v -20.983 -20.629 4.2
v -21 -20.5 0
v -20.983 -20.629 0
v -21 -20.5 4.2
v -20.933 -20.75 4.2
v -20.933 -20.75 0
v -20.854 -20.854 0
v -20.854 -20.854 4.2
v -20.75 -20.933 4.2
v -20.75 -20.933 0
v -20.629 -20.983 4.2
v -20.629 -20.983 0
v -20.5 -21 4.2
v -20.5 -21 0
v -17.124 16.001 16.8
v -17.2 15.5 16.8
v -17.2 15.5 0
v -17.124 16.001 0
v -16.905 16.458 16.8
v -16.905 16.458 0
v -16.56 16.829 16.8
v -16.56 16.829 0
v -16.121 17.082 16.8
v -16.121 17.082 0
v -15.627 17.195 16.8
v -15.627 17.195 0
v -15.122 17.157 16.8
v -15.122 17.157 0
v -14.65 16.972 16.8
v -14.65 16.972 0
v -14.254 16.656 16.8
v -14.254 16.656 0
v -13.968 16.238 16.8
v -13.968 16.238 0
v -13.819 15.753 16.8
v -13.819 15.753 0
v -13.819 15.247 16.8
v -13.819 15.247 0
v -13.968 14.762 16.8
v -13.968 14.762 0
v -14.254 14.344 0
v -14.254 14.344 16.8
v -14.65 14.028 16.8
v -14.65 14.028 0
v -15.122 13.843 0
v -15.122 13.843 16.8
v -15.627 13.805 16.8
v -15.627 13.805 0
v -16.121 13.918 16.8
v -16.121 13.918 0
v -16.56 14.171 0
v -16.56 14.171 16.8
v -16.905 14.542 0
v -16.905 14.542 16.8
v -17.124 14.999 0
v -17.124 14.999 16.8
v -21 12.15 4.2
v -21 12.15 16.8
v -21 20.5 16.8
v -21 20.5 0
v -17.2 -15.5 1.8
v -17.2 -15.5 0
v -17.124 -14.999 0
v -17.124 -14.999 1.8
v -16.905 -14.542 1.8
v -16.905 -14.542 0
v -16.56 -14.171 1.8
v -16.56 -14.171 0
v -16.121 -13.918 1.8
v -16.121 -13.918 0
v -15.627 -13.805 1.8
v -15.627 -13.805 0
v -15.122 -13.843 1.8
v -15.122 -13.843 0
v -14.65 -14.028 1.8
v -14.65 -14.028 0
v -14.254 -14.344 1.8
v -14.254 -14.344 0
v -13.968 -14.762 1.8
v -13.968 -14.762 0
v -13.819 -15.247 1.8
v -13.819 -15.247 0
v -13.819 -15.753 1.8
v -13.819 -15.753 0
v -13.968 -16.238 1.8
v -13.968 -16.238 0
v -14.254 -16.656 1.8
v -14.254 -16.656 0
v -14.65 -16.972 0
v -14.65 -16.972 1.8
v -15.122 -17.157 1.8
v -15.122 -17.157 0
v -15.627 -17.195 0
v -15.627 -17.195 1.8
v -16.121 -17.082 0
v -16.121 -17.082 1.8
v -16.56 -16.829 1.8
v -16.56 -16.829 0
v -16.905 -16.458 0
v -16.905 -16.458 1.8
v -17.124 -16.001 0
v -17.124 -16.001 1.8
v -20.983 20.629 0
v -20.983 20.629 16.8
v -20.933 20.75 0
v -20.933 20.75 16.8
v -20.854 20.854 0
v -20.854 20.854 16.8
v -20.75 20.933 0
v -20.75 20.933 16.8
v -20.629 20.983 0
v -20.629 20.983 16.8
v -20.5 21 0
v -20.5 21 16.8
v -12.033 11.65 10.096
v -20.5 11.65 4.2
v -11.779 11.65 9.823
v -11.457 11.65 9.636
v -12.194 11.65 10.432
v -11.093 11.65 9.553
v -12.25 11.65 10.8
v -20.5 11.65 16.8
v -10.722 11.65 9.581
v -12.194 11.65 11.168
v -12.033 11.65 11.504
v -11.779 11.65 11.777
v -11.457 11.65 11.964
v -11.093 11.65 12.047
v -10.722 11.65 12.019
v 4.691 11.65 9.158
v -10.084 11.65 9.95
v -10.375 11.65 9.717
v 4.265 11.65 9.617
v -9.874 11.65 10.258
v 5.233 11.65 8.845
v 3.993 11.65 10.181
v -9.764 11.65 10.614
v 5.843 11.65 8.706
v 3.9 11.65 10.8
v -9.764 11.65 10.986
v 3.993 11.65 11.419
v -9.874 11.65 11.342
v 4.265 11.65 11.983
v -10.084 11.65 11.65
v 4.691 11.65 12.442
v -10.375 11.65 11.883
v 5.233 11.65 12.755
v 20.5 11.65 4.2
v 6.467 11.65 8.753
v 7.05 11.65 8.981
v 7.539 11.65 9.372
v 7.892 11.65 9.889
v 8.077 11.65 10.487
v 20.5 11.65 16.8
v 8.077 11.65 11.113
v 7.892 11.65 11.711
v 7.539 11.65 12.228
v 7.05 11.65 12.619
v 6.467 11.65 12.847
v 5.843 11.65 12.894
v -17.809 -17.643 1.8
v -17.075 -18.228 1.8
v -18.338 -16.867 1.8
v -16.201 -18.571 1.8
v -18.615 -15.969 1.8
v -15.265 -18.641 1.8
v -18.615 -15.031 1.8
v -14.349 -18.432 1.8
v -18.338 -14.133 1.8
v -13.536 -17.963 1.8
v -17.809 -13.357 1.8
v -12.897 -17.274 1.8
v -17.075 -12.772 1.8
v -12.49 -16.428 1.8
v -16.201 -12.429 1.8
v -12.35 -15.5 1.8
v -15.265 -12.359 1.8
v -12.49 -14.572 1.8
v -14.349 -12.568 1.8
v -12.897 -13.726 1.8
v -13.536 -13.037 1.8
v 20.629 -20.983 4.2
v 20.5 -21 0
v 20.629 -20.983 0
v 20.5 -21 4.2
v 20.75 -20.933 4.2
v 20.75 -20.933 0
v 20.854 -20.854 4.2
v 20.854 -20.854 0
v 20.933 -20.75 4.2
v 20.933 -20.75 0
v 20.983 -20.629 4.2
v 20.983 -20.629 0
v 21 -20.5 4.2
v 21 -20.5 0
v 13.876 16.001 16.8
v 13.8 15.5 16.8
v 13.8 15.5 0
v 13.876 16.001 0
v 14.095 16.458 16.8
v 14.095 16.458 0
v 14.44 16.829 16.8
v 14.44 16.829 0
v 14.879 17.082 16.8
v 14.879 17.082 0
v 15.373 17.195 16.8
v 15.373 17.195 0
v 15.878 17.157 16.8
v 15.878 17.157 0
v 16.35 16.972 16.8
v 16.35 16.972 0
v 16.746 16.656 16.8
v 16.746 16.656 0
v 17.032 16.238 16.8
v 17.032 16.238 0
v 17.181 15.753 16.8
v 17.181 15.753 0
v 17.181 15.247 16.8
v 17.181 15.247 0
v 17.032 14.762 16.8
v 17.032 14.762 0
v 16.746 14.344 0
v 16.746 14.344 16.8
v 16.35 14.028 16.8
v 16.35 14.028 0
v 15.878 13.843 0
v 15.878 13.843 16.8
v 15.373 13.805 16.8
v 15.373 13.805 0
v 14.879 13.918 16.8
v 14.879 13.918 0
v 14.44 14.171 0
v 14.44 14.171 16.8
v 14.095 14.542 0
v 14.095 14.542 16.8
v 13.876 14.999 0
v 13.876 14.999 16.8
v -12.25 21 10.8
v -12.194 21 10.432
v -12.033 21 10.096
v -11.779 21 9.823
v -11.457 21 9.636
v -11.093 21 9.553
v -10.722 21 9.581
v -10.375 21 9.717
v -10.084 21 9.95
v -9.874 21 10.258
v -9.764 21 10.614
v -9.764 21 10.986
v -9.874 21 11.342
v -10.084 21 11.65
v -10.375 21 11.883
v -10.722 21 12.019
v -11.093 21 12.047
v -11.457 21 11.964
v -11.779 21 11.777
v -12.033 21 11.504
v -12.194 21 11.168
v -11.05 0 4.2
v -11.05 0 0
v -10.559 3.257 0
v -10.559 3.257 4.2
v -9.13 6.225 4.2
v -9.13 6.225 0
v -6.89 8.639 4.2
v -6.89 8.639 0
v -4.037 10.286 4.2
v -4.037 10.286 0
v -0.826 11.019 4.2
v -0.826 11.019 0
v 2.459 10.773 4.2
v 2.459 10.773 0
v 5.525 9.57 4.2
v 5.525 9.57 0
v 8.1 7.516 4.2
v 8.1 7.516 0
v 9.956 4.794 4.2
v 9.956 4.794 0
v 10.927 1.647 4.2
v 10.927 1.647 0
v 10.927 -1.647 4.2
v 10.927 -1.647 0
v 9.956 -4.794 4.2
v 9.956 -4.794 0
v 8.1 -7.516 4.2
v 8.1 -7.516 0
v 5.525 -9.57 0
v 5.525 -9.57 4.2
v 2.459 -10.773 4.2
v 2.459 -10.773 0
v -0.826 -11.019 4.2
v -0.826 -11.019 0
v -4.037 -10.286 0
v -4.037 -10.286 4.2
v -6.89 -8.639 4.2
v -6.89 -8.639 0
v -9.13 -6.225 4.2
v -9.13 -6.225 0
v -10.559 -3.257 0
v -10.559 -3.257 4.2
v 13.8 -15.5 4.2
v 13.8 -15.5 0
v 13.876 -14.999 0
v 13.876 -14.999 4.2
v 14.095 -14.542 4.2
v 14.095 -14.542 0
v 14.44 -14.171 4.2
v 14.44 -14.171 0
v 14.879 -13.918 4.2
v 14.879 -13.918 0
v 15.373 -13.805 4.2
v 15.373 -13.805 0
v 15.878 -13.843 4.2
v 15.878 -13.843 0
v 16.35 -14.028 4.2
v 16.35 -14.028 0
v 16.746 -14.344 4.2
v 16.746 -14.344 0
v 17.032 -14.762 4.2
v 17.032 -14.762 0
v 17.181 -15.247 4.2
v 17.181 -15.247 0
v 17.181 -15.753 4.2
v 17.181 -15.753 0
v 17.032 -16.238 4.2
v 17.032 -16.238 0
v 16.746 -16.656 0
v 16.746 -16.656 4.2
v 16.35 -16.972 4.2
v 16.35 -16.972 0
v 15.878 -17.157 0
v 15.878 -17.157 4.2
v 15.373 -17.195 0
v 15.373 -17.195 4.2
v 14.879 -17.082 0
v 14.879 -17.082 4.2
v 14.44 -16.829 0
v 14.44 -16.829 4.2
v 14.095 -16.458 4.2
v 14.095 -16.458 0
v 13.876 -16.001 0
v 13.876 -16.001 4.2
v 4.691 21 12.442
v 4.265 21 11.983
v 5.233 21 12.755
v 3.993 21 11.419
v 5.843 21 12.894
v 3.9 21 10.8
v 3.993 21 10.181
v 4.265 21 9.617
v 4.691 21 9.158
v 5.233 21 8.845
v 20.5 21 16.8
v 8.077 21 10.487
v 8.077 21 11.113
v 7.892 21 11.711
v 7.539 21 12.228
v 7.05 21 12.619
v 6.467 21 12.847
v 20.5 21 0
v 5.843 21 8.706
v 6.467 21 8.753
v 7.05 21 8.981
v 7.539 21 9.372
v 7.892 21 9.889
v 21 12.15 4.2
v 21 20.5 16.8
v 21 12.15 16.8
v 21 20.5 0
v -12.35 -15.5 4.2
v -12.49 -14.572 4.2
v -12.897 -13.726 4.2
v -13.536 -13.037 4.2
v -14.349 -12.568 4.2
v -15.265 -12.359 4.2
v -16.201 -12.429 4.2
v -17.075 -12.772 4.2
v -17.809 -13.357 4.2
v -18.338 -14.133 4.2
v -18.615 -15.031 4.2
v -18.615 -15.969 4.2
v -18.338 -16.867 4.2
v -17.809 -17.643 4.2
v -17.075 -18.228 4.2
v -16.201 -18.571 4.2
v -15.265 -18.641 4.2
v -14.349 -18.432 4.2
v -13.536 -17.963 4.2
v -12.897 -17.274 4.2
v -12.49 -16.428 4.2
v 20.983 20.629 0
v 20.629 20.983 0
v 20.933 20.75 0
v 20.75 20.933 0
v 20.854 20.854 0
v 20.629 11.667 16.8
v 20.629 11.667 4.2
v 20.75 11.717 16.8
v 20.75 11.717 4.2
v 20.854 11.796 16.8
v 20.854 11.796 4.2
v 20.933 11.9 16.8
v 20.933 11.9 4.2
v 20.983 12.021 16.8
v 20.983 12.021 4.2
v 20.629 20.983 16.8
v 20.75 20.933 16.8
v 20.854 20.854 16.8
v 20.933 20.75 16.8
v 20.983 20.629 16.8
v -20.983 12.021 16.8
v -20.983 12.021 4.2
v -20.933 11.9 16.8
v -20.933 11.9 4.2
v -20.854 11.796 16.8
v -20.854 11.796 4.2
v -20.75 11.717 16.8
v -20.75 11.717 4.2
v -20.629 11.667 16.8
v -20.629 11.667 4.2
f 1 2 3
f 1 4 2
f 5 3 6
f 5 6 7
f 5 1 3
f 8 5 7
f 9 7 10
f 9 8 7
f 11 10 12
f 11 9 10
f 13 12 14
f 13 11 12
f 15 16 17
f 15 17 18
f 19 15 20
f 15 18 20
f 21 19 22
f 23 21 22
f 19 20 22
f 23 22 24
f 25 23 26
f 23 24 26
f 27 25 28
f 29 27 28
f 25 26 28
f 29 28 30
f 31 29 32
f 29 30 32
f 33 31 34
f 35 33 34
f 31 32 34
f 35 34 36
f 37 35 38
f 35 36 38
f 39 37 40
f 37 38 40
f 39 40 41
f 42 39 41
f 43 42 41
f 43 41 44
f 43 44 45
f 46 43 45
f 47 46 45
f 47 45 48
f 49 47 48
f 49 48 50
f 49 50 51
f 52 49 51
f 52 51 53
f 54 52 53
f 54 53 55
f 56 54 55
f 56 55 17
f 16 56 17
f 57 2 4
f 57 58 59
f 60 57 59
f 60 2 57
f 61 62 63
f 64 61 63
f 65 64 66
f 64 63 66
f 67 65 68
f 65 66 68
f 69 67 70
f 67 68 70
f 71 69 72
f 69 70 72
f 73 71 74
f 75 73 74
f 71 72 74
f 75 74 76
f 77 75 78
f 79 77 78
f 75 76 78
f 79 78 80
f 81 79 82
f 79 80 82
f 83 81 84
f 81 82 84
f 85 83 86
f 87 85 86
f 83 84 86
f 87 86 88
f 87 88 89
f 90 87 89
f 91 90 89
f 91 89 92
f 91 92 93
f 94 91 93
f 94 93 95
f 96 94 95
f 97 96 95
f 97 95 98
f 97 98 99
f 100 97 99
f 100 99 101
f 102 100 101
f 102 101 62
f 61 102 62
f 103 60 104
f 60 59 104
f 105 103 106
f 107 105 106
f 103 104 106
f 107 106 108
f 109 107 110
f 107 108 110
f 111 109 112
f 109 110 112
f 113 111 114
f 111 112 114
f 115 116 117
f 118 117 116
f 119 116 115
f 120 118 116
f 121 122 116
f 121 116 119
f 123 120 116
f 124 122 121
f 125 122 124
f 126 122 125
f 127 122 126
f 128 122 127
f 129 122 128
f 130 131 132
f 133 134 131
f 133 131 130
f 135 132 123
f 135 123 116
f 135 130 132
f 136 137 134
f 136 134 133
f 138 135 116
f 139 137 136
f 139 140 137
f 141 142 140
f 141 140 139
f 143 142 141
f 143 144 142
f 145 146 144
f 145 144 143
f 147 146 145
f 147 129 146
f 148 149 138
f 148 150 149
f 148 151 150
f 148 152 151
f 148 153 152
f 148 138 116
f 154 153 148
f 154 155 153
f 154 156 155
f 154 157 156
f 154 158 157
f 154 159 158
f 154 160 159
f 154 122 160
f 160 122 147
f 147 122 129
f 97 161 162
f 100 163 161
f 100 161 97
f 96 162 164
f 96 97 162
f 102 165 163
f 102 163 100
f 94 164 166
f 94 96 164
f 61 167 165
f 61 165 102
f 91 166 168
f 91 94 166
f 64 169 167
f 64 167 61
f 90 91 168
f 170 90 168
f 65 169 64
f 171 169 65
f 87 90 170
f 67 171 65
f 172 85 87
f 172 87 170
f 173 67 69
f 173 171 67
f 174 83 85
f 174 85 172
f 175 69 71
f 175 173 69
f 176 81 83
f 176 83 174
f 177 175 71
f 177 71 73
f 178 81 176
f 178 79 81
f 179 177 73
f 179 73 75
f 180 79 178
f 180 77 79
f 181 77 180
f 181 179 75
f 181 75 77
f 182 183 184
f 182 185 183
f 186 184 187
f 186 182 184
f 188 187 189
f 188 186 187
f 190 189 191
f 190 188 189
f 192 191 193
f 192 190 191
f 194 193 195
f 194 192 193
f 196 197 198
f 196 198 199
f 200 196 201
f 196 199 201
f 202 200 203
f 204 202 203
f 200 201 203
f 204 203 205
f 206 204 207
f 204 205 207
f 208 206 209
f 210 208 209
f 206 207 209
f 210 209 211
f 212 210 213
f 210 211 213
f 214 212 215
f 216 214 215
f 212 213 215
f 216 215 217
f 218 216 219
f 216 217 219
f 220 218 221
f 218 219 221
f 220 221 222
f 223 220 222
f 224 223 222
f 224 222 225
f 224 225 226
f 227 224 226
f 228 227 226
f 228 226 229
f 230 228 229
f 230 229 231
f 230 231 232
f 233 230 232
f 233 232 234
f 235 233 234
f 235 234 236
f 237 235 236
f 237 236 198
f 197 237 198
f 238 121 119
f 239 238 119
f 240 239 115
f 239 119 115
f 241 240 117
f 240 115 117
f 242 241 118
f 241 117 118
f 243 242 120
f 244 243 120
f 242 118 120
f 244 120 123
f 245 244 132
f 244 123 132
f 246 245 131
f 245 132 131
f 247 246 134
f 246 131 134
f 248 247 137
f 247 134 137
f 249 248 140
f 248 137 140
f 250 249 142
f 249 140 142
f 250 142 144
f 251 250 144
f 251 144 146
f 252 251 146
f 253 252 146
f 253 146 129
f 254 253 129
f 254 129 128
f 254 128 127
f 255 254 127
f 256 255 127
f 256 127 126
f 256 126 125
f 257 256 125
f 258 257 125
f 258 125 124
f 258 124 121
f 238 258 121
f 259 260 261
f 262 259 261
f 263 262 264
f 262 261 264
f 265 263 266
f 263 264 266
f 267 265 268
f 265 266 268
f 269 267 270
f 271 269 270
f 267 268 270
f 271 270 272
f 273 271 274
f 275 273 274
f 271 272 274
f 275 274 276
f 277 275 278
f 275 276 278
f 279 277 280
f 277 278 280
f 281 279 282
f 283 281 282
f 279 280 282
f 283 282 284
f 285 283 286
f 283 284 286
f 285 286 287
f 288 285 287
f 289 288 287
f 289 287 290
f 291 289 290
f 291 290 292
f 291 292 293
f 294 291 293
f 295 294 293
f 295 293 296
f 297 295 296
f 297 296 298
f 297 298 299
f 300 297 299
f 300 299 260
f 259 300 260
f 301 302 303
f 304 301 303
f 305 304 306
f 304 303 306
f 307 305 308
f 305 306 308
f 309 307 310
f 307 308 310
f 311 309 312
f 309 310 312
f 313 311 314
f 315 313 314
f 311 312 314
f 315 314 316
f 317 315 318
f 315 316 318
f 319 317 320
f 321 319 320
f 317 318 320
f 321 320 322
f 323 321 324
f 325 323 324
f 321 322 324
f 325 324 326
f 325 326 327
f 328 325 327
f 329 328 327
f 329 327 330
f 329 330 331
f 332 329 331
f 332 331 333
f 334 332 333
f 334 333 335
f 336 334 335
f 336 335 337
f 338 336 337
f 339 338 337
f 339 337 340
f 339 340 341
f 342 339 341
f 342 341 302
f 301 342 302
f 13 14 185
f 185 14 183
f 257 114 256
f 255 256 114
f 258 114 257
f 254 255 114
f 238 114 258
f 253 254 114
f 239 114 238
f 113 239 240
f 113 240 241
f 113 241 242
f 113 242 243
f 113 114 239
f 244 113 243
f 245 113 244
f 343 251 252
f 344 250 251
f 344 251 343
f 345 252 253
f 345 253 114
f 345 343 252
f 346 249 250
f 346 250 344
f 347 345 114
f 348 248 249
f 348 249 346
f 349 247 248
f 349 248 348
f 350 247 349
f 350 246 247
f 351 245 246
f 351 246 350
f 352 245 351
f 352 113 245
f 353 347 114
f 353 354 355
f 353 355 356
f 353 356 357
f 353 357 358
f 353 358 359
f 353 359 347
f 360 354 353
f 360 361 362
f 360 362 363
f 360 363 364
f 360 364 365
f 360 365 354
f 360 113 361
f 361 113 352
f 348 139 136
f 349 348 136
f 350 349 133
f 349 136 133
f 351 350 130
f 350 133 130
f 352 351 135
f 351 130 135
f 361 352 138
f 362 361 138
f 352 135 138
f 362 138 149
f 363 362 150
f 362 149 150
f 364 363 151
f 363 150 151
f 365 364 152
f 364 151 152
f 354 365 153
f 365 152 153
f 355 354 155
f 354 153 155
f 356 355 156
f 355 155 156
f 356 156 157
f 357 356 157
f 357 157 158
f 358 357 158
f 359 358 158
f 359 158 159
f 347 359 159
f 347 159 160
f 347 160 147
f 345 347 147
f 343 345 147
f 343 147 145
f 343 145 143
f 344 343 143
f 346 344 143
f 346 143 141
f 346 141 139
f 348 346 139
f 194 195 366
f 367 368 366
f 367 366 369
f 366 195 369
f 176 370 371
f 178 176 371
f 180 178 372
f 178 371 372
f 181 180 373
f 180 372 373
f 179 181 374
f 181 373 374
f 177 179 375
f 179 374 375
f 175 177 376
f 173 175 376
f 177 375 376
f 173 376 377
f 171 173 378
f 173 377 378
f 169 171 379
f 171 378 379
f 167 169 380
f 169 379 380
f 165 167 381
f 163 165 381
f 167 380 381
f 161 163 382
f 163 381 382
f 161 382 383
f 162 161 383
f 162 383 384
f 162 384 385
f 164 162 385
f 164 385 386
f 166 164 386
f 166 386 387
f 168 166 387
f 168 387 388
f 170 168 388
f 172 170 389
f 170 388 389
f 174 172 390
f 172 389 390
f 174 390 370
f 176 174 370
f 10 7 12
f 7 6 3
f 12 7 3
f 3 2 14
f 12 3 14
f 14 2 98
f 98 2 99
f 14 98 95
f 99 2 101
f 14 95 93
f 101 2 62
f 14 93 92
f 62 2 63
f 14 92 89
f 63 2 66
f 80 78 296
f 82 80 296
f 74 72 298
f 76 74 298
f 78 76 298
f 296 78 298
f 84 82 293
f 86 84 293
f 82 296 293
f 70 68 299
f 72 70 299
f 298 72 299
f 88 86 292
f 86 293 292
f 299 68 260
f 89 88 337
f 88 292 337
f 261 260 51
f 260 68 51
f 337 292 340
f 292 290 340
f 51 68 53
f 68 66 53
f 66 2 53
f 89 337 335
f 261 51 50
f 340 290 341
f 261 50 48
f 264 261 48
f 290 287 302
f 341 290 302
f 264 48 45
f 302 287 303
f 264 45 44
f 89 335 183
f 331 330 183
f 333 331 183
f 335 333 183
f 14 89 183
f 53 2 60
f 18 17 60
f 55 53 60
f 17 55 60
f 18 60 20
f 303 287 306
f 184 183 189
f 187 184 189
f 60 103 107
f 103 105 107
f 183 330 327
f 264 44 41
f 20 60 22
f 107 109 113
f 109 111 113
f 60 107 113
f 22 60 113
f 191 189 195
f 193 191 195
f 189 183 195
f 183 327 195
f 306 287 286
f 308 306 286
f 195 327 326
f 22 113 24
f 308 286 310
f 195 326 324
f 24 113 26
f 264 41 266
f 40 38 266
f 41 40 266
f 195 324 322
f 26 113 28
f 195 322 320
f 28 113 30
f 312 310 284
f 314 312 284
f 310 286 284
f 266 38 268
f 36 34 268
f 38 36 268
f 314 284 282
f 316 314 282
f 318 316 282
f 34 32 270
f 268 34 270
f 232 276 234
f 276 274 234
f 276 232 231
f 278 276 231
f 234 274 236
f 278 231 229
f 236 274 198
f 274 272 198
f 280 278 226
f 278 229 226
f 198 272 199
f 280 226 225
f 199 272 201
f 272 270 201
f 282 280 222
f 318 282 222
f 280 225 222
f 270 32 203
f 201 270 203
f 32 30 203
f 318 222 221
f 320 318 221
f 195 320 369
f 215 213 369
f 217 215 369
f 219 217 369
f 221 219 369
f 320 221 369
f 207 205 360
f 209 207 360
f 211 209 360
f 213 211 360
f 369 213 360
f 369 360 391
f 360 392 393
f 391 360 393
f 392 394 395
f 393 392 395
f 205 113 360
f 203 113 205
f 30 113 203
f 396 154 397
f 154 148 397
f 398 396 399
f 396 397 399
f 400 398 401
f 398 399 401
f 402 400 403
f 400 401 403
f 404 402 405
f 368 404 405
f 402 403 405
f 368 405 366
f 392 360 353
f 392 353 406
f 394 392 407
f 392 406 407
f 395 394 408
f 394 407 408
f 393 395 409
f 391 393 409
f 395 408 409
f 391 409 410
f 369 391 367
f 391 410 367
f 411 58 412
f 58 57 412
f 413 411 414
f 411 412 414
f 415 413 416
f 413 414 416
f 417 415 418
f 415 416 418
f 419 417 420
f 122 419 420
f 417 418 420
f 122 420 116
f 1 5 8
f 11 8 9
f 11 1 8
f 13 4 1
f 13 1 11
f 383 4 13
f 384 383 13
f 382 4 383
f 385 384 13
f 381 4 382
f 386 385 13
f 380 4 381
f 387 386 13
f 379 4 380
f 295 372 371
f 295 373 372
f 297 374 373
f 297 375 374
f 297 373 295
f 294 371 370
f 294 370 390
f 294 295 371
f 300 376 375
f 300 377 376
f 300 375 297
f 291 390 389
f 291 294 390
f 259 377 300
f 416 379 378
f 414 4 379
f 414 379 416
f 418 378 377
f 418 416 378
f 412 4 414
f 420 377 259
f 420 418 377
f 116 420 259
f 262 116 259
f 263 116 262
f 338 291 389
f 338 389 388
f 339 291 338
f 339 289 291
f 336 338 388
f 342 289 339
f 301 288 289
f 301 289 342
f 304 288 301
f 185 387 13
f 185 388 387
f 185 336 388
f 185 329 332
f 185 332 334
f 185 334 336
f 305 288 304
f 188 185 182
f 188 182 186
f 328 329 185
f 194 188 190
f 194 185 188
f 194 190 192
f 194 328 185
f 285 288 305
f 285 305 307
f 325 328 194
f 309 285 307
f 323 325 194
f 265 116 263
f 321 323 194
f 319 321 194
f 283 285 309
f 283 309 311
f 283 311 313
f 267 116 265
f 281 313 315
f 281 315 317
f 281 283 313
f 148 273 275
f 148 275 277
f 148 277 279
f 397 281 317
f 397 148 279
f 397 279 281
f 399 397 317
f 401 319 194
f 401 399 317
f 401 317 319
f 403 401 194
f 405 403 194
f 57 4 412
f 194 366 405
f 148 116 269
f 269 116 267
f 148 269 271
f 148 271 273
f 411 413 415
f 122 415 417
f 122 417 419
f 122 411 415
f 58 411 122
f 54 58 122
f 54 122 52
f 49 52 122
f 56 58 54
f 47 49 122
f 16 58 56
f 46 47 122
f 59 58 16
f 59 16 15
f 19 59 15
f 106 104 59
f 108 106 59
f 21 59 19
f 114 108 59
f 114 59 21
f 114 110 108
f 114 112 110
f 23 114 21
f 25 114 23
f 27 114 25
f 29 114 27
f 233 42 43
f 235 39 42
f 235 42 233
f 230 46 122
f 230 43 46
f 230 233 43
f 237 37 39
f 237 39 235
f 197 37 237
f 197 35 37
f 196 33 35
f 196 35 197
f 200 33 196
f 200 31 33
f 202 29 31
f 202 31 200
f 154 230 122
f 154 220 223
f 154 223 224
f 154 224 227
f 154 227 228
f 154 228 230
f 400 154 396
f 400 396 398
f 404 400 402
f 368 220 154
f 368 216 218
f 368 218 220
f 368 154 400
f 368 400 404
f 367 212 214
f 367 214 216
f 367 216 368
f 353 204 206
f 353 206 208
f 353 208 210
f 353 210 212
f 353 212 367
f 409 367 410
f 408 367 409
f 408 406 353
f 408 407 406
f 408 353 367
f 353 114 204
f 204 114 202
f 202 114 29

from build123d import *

# Parameters (mm, degrees)
SKETCH1_W            = 42
SKETCH1_H            = 42
BOSS_EXTRUDE1_DEPTH  = 16.8
SKETCH2_W            = 42
SKETCH2_H            = 32.65
CUT_EXTRUDE1_DEPTH   = 12.6
CUT_EXTRUDE2_REACH   = 36.121
SKETCH3_R            = 11.05
M3_CLEARANCE_HOLE1_D = 3.4
SKETCH6_R            = 3.15
CUT_EXTRUDE3_DEPTH   = 2.4
M5_TAPPED_HOLE1_D    = 4.2
M3_TAPPED_HOLE1_D    = 2.5
FILLET1_R            = 0.5


with BuildPart() as part:
    # Sketch1 → Boss-Extrude1 (new body)
    with BuildSketch(Plane.XY):
        Rectangle(SKETCH1_W, SKETCH1_H)
    extrude(amount=BOSS_EXTRUDE1_DEPTH)

    # Sketch2 → Cut-Extrude1 (cut)
    with BuildSketch(Plane.XY.offset(16.8)):
        with Locations((0, -4.675)):
            Rectangle(SKETCH2_W, SKETCH2_H)
    extrude(amount=-CUT_EXTRUDE1_DEPTH, mode=Mode.SUBTRACT)

    # Sketch3 → Cut-Extrude2 (cut, up to next)
    with BuildSketch(Plane(origin=(0, 0, 0), x_dir=(-1, 0, 0), z_dir=(0, 0, -1)), mode=Mode.PRIVATE) as cut_extrude2_sk1:
        Circle(SKETCH3_R)
    cut_extrude2_tool1 = extrude(cut_extrude2_sk1.sketch, amount=-CUT_EXTRUDE2_REACH, mode=Mode.PRIVATE) & part.part
    add(cut_extrude2_tool1.solids().sort_by_distance((0, 0, 0))[0], mode=Mode.SUBTRACT)

    # M3 Clearance Hole1 (through all)
    with Locations(Plane.XY.offset(16.8)):
        with Locations((15.5, 15.5), (-15.5, 15.5), (-15.5, -15.5), (15.5, -15.5)):
            Hole(M3_CLEARANCE_HOLE1_D / 2)

    # Sketch6 → Cut-Extrude3 (cut)
    with BuildSketch(Plane.XY.offset(4.2)):
        with Locations((-15.5, -15.5)):
            Circle(SKETCH6_R)
    extrude(amount=-CUT_EXTRUDE3_DEPTH, mode=Mode.SUBTRACT)

    # M5 Tapped Hole1 (through all)
    with Locations(Plane(origin=(0, 21, 0), x_dir=(1, 0, 0), z_dir=(0, 1, 0))):
        with Locations((6, -10.8)):
            Hole(M5_TAPPED_HOLE1_D / 2)

    # M3 Tapped Hole1 (through all)
    with Locations(Plane(origin=(0, 21, 0), x_dir=(1, 0, 0), z_dir=(0, 1, 0))):
        with Locations((-11, -10.8)):
            Hole(M3_TAPPED_HOLE1_D / 2)

    # Fillet1
    fillet1_edges = [part.edges().sort_by_distance(p)[0] for p in [
        (21, -21, 2.1),
        (-21, -21, 2.1),
        (-21, 11.65, 10.5),
        (21, 11.65, 10.5),
        (-21, 21, 8.4),
        (21, 21, 8.4),
    ]]
    fillet(fillet1_edges, radius=FILLET1_R)


solid = part.part
